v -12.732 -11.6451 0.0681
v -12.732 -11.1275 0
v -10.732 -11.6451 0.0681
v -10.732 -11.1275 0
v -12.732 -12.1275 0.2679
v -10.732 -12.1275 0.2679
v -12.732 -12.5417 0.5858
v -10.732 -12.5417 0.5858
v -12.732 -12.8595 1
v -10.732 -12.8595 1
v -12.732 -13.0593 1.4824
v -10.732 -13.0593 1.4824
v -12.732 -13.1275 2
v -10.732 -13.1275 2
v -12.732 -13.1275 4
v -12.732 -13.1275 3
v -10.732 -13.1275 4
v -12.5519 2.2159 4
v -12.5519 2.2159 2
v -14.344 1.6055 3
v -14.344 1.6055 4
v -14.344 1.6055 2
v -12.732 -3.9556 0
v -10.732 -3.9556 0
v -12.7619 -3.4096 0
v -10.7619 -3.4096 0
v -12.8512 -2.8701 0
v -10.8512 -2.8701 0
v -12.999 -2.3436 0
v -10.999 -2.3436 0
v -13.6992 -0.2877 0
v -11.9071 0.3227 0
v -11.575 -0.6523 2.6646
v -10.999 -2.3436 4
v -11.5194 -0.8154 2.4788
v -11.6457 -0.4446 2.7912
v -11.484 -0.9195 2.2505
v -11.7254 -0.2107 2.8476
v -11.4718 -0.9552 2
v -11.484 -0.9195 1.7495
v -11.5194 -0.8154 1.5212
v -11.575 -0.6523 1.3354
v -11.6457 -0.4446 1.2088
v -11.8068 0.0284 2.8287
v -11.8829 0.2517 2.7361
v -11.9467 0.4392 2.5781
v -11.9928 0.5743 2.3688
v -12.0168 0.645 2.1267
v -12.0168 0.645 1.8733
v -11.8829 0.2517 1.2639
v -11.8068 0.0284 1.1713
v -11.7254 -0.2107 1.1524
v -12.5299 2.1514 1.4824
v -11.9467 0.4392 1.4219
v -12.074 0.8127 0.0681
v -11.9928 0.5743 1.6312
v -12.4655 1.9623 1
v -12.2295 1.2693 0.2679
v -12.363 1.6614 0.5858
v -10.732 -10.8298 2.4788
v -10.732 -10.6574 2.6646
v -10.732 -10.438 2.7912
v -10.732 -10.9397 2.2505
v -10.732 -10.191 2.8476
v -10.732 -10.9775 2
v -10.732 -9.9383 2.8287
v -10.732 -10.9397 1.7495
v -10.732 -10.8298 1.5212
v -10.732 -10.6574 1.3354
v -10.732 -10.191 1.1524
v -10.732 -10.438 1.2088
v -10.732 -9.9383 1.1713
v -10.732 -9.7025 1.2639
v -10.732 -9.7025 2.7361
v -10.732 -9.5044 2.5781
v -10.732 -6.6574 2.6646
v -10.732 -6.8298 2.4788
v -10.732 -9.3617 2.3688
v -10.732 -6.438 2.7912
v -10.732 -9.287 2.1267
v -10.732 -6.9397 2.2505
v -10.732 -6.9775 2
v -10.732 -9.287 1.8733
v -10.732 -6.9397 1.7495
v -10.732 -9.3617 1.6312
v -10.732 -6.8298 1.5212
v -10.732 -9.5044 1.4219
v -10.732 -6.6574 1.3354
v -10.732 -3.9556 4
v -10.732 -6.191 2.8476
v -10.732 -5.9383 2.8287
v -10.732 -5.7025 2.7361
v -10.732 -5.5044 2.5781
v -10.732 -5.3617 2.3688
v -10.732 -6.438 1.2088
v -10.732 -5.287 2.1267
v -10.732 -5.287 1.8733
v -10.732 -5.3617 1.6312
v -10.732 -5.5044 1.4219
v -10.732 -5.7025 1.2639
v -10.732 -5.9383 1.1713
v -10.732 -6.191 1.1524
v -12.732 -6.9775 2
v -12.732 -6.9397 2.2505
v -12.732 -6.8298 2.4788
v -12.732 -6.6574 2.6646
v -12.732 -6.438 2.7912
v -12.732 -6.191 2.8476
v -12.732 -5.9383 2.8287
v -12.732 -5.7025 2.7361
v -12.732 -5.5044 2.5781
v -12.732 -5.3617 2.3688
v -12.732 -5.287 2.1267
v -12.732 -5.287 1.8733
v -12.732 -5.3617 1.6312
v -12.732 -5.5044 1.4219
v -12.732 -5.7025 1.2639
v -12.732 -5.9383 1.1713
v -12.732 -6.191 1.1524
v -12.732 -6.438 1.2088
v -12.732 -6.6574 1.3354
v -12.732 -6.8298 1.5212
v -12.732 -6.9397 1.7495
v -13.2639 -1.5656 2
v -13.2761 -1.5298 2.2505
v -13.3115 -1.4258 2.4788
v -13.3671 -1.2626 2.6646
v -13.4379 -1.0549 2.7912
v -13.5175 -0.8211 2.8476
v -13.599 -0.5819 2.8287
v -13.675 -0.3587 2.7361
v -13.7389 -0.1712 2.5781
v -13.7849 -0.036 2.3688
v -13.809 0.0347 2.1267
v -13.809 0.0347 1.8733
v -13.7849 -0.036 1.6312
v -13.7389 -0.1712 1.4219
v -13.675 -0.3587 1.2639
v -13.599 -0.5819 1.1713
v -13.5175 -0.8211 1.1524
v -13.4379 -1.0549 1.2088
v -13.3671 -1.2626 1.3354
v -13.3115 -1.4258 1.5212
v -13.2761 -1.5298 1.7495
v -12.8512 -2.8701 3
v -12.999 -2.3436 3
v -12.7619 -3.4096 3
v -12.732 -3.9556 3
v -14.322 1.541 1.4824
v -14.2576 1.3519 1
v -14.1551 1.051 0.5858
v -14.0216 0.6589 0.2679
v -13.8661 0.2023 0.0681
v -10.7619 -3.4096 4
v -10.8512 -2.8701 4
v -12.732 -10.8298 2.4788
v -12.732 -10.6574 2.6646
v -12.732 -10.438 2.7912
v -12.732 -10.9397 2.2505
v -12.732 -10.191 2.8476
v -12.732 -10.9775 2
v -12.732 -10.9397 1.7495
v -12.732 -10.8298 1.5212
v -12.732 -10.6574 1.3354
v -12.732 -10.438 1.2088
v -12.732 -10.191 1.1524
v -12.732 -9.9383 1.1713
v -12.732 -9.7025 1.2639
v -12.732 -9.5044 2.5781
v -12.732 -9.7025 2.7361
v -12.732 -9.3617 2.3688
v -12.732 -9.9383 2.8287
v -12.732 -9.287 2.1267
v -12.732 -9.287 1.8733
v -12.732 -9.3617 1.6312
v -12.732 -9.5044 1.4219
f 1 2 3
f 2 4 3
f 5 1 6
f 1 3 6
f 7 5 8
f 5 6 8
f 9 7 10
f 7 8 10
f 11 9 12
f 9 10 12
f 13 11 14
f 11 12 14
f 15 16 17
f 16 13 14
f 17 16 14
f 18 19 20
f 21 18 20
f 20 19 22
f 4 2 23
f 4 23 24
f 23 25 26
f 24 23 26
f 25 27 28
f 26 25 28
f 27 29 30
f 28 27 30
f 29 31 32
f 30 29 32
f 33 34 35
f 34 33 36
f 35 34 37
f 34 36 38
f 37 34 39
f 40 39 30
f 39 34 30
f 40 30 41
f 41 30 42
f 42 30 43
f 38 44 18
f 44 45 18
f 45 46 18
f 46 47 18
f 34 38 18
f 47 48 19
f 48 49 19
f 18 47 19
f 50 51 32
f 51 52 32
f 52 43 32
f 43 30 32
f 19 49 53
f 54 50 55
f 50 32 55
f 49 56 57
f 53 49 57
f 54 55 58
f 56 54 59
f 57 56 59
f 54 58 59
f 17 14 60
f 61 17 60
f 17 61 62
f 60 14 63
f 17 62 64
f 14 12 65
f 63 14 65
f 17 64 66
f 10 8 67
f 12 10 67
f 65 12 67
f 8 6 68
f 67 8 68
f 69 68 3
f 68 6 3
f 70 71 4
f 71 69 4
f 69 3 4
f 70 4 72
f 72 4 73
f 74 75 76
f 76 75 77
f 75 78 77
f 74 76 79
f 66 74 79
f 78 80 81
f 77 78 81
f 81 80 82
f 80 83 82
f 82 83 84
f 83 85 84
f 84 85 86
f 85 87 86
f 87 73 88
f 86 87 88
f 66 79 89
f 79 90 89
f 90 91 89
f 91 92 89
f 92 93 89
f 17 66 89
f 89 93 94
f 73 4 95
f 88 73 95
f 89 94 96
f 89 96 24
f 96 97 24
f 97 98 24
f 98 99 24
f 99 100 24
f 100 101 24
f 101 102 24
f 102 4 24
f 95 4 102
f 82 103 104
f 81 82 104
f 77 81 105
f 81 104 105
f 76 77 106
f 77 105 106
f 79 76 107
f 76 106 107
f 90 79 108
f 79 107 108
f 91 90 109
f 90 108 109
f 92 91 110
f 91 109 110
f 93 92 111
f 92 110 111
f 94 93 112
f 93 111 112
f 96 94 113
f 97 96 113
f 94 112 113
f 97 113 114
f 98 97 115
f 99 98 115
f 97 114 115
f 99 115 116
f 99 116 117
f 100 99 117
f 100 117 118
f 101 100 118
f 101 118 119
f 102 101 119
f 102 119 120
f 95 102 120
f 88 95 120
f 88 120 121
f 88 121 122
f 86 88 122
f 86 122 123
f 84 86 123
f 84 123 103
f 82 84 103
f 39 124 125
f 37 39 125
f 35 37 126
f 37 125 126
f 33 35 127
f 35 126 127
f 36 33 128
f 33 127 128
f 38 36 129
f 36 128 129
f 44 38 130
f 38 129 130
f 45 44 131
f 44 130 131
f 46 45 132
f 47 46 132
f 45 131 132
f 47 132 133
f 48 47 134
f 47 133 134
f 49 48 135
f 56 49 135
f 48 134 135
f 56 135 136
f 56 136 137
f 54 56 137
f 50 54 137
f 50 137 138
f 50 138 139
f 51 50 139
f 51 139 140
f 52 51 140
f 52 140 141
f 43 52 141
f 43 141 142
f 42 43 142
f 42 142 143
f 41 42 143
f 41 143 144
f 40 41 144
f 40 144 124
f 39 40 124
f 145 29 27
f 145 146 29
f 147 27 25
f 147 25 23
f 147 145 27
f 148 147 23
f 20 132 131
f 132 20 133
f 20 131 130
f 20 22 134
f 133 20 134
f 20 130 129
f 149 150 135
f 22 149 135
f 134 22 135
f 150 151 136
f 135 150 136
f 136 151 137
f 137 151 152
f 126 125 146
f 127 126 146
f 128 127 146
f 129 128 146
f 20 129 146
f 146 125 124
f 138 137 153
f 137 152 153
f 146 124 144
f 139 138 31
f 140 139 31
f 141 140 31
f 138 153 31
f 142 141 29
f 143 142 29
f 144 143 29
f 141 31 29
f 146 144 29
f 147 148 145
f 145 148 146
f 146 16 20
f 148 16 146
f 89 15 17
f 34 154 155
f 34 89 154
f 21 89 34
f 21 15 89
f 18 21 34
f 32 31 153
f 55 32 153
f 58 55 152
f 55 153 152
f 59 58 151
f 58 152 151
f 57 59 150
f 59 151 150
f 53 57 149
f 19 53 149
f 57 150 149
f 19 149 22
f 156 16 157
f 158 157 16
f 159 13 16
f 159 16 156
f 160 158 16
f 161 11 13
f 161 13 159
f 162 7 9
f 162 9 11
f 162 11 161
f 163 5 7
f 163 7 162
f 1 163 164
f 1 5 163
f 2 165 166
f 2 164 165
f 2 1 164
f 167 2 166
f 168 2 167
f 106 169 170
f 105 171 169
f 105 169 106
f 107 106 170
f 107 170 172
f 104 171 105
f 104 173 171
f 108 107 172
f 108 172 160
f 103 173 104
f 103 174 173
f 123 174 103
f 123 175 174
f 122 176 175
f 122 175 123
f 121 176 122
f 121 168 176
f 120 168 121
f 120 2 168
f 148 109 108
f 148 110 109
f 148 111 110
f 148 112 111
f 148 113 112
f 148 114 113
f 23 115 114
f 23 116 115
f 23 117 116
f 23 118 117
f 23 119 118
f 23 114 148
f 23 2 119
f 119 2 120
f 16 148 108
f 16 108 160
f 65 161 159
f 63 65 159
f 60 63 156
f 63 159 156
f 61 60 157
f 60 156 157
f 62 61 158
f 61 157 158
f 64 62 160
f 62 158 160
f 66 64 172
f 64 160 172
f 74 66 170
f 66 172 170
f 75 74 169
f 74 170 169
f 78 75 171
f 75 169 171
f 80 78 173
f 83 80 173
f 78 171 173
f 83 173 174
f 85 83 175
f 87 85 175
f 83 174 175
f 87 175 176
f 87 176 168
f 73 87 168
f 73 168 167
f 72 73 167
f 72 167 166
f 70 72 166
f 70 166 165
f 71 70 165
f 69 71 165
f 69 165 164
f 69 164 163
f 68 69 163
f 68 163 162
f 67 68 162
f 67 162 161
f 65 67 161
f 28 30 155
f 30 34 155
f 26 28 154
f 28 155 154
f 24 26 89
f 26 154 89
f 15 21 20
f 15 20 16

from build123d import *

# Parameters (mm, degrees)
F0_W     = 2
F0_H     = 10
F1_DEPTH = 4
F3_DEPTH = 1
F4_R     = 0.85
F5_DEPTH = 25
F6_R     = 0.85
F7_DEPTH = 25
F8_R     = 5
F9_R     = 5
F10_R    = 2


with BuildPart() as f1:
    # F0 (on Top) → F1 (new body)
    with BuildSketch(Plane.XY):
        Polygon((-14.343983, 1.605531), (-12.731962, -3.12748), (-10.731962, -3.12748), (-12.551871, 2.215907), align=None)
        with Locations((-11.731962, -8.12748)):
            Rectangle(F0_W, F0_H)
    extrude(amount=F1_DEPTH)

    # F2 (on face) → F3 (join)
    with BuildSketch(Plane.XY.offset(4)):
        Polygon((-12.731962, -3.12748), (-14.343983, 1.605531), (-12.731962, -13.12748), align=None)
    extrude(amount=-F3_DEPTH)

    # F4 (on face) → F5 (cut)
    with BuildSketch(Plane(origin=(-12.363017, -4.210731, 0), x_dir=(0.322404, -0.946602, 0), z_dir=(-0.946602, -0.322404, 0))):
        with Locations((-3.644357, 2)):
            Circle(F4_R)
    extrude(amount=-F5_DEPTH, mode=Mode.SUBTRACT)

    # F6 (on face) → F7 (cut)
    with BuildSketch(Plane(origin=(-12.731962, 0, 0), x_dir=(0, -1, 0), z_dir=(-1, 0, 0))):
        with Locations((6.12748, 2)):
            Circle(F6_R)
        with Locations((10.12748, 2)):
            Circle(F6_R)
    extrude(amount=-F7_DEPTH, mode=Mode.SUBTRACT)

    # F8
    f8_edges = [f1.edges().sort_by_distance(p)[0] for p in [
        (-12.731962, -3.12748, 1.5),
    ]]
    fillet(f8_edges, radius=F8_R)

    # F9
    f9_edges = [f1.edges().sort_by_distance(p)[0] for p in [
        (-10.731962, -3.12748, 2),
    ]]
    fillet(f9_edges, radius=F9_R)

    # F10
    f10_edges = [f1.edges().sort_by_distance(p)[0] for p in [
        (-11.731962, -13.12748, 0),
        (-13.447927, 1.910719, 0),
    ]]
    fillet(f10_edges, radius=F10_R)


solid = f1.part
